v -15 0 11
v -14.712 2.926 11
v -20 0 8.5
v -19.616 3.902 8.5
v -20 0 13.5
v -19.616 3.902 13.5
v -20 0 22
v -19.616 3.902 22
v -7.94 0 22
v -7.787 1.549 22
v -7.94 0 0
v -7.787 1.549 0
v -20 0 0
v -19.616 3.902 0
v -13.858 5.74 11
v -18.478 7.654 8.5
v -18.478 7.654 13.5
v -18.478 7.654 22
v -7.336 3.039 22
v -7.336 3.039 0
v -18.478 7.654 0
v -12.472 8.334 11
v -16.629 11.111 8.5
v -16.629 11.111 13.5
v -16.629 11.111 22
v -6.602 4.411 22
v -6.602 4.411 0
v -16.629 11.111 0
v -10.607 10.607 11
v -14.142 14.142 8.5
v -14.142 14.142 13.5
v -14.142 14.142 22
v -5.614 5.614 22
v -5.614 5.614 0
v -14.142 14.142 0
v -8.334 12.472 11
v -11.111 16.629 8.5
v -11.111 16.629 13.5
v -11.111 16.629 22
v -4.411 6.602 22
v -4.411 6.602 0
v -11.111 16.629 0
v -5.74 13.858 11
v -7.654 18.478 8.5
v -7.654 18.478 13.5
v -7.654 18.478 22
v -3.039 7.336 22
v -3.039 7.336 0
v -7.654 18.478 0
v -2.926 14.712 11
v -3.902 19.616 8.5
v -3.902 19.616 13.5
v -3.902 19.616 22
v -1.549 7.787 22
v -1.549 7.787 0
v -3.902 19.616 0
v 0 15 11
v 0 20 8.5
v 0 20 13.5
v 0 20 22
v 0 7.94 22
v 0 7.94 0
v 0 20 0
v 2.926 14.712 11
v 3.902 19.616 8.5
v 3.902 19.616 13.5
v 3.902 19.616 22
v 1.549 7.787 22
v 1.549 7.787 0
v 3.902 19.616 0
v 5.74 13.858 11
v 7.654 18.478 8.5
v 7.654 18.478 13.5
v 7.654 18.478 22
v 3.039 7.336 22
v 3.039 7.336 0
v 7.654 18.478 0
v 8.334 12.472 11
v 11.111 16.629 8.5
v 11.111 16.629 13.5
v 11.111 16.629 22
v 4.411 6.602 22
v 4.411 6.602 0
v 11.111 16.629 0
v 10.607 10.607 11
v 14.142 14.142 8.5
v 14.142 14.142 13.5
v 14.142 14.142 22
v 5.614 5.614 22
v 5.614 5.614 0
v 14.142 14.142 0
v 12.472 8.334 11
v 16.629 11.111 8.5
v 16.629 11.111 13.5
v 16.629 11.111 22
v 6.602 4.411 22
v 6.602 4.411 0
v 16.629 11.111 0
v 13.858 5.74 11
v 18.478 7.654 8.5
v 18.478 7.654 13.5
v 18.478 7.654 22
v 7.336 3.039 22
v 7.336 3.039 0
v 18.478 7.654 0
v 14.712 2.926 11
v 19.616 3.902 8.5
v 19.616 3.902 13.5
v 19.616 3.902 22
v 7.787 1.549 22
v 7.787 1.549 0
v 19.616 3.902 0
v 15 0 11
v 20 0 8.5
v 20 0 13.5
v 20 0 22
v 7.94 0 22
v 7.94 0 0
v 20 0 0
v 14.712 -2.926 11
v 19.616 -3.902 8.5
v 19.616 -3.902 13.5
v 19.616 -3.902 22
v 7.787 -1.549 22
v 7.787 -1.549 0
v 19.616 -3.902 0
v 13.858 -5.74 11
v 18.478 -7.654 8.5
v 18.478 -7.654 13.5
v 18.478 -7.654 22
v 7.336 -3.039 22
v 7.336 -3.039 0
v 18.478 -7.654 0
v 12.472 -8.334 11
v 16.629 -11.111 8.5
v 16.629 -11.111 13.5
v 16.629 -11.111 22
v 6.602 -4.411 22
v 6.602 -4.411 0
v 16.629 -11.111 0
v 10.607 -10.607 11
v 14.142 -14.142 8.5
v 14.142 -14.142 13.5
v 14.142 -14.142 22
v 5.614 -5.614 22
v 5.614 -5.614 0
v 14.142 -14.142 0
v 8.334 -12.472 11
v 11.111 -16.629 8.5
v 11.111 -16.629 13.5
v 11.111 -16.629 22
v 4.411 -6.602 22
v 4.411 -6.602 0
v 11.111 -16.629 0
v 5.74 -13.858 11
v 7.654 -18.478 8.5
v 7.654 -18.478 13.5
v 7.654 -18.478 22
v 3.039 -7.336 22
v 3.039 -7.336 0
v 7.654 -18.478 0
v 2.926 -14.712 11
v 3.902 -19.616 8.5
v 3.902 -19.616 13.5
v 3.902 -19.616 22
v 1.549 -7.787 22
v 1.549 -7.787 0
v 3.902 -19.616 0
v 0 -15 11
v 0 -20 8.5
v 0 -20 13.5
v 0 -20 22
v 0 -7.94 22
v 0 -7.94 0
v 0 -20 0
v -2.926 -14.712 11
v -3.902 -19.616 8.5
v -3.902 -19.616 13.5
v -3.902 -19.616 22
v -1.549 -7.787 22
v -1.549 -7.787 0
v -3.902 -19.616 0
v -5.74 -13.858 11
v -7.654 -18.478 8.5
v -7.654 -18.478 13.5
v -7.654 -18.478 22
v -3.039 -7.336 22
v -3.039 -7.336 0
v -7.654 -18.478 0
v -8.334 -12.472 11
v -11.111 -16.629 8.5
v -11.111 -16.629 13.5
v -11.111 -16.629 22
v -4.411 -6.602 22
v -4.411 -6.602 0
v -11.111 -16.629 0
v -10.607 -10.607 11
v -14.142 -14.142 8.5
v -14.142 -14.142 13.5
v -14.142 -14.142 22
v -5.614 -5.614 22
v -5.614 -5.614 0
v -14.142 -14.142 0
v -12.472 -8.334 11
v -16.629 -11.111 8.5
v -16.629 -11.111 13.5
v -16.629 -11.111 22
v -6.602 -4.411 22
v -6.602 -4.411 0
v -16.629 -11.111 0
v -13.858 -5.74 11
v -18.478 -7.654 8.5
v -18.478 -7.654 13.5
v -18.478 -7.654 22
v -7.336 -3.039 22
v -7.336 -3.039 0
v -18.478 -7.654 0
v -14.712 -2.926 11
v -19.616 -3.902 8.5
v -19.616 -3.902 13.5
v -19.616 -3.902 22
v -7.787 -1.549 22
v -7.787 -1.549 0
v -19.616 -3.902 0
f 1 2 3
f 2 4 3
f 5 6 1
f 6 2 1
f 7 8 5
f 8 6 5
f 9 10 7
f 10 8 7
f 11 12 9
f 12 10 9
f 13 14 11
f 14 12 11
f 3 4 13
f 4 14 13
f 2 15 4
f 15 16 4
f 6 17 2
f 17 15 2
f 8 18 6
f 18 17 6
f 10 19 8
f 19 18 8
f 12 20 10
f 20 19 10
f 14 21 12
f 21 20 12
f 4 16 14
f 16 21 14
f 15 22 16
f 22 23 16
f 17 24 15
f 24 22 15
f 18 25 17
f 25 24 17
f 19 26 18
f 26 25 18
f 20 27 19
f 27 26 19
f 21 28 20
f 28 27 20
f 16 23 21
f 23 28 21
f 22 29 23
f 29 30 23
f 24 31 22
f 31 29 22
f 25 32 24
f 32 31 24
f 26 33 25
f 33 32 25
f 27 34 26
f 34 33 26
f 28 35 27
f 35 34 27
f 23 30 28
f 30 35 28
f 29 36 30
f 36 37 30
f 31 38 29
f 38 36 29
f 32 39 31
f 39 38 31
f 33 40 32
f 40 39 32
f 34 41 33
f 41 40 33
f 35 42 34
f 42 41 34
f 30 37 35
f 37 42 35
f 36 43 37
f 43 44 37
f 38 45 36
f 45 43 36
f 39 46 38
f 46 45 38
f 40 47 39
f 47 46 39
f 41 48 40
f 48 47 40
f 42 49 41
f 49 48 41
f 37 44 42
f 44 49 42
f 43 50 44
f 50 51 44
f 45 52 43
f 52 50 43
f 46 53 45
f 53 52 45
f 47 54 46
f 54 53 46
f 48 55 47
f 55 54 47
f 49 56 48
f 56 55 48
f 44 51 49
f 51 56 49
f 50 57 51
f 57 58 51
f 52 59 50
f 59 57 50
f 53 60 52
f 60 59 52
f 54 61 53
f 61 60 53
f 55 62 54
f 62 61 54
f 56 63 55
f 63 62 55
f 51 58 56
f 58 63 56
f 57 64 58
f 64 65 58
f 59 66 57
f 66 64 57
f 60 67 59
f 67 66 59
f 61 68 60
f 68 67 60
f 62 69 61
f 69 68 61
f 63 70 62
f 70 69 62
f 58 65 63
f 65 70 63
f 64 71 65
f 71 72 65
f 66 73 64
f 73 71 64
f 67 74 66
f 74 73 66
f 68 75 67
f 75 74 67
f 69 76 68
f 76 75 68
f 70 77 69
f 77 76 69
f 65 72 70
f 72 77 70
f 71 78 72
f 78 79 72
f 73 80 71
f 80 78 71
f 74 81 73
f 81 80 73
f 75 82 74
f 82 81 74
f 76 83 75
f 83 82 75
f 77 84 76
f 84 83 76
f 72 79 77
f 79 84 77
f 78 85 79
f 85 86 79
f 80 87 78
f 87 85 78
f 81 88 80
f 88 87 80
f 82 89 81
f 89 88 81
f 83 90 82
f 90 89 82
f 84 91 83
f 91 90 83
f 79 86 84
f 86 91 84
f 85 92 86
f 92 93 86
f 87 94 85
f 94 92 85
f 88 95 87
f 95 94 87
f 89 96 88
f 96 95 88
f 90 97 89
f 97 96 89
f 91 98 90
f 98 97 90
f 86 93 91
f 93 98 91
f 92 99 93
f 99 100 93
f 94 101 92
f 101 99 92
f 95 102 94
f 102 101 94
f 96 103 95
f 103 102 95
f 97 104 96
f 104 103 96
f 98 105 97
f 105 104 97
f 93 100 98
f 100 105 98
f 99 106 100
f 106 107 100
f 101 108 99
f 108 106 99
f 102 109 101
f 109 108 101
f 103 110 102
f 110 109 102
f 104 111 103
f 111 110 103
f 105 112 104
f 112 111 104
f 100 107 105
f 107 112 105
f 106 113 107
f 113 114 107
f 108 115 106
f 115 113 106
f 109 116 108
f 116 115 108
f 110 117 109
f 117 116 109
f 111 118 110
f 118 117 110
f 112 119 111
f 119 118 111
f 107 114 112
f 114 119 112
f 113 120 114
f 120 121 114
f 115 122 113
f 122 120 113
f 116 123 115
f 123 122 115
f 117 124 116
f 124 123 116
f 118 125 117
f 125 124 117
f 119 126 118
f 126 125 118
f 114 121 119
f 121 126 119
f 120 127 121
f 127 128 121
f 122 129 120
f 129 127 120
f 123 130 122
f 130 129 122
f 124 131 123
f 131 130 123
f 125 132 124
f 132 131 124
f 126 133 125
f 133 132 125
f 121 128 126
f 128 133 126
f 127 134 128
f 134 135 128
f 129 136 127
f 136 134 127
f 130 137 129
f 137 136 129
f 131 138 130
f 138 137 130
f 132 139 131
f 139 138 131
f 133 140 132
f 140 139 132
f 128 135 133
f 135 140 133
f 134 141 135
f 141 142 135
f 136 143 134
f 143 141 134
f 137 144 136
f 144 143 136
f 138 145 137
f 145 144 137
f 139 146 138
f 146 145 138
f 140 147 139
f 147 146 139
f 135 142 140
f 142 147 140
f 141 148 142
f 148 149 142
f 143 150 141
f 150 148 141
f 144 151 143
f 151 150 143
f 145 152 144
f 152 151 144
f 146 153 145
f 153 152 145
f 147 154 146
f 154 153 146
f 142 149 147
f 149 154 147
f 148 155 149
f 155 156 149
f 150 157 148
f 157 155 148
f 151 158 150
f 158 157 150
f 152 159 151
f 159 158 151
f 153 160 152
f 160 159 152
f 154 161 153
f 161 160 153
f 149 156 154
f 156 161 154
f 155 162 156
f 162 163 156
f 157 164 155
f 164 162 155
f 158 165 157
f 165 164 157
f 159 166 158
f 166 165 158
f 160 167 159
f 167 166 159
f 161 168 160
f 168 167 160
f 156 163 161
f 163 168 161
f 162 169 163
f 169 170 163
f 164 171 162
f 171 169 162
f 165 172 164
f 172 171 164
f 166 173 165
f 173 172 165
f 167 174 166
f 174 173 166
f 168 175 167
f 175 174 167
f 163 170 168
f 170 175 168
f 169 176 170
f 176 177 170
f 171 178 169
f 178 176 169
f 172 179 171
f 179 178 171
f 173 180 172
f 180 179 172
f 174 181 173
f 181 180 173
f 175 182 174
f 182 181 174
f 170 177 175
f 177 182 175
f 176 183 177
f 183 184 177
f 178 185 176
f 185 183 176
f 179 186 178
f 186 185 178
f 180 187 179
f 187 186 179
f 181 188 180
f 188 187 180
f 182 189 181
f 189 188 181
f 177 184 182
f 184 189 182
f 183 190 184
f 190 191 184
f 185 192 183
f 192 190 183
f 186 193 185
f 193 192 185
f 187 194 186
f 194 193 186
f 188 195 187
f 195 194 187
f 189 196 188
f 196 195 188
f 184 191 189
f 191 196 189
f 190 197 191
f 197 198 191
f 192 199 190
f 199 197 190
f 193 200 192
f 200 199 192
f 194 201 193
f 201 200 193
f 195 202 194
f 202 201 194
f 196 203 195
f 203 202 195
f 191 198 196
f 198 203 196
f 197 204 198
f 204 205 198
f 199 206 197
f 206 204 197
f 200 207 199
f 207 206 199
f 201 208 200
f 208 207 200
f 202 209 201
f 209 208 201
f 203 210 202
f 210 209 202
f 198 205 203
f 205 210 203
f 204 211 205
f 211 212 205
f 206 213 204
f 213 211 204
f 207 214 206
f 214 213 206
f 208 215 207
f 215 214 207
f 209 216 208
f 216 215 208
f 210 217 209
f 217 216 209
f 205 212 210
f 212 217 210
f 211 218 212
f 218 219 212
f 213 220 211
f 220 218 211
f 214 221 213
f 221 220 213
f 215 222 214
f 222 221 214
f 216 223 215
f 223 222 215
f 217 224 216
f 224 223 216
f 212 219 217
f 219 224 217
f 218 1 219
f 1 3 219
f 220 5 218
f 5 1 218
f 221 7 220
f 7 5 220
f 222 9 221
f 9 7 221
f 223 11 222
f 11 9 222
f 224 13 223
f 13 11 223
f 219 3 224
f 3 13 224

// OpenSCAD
$fn = 32;

// ----------------------------------------------------------------------
// Belt roller: 40 mm barrel, 22 mm wide, bore 15.88 mm
// ----------------------------------------------------------------------

// --- parameters (mm) ---
bore_d = 15.88;           // bore
barrel_d = 40;            // barrel diameter
roller_w = 22;            // roller width
groove_w = 5;             // guide groove width
groove_d = 5;             // guide groove depth

roller_profile = [[7.94, 0], [20, 0], [20, 8.5], [15, 11], [20, 13.5], [20, 22], [7.94, 22]];

/* the profile stays clear of the axis, so the bore comes out of the revolve */
rotate_extrude() polygon(roller_profile);
